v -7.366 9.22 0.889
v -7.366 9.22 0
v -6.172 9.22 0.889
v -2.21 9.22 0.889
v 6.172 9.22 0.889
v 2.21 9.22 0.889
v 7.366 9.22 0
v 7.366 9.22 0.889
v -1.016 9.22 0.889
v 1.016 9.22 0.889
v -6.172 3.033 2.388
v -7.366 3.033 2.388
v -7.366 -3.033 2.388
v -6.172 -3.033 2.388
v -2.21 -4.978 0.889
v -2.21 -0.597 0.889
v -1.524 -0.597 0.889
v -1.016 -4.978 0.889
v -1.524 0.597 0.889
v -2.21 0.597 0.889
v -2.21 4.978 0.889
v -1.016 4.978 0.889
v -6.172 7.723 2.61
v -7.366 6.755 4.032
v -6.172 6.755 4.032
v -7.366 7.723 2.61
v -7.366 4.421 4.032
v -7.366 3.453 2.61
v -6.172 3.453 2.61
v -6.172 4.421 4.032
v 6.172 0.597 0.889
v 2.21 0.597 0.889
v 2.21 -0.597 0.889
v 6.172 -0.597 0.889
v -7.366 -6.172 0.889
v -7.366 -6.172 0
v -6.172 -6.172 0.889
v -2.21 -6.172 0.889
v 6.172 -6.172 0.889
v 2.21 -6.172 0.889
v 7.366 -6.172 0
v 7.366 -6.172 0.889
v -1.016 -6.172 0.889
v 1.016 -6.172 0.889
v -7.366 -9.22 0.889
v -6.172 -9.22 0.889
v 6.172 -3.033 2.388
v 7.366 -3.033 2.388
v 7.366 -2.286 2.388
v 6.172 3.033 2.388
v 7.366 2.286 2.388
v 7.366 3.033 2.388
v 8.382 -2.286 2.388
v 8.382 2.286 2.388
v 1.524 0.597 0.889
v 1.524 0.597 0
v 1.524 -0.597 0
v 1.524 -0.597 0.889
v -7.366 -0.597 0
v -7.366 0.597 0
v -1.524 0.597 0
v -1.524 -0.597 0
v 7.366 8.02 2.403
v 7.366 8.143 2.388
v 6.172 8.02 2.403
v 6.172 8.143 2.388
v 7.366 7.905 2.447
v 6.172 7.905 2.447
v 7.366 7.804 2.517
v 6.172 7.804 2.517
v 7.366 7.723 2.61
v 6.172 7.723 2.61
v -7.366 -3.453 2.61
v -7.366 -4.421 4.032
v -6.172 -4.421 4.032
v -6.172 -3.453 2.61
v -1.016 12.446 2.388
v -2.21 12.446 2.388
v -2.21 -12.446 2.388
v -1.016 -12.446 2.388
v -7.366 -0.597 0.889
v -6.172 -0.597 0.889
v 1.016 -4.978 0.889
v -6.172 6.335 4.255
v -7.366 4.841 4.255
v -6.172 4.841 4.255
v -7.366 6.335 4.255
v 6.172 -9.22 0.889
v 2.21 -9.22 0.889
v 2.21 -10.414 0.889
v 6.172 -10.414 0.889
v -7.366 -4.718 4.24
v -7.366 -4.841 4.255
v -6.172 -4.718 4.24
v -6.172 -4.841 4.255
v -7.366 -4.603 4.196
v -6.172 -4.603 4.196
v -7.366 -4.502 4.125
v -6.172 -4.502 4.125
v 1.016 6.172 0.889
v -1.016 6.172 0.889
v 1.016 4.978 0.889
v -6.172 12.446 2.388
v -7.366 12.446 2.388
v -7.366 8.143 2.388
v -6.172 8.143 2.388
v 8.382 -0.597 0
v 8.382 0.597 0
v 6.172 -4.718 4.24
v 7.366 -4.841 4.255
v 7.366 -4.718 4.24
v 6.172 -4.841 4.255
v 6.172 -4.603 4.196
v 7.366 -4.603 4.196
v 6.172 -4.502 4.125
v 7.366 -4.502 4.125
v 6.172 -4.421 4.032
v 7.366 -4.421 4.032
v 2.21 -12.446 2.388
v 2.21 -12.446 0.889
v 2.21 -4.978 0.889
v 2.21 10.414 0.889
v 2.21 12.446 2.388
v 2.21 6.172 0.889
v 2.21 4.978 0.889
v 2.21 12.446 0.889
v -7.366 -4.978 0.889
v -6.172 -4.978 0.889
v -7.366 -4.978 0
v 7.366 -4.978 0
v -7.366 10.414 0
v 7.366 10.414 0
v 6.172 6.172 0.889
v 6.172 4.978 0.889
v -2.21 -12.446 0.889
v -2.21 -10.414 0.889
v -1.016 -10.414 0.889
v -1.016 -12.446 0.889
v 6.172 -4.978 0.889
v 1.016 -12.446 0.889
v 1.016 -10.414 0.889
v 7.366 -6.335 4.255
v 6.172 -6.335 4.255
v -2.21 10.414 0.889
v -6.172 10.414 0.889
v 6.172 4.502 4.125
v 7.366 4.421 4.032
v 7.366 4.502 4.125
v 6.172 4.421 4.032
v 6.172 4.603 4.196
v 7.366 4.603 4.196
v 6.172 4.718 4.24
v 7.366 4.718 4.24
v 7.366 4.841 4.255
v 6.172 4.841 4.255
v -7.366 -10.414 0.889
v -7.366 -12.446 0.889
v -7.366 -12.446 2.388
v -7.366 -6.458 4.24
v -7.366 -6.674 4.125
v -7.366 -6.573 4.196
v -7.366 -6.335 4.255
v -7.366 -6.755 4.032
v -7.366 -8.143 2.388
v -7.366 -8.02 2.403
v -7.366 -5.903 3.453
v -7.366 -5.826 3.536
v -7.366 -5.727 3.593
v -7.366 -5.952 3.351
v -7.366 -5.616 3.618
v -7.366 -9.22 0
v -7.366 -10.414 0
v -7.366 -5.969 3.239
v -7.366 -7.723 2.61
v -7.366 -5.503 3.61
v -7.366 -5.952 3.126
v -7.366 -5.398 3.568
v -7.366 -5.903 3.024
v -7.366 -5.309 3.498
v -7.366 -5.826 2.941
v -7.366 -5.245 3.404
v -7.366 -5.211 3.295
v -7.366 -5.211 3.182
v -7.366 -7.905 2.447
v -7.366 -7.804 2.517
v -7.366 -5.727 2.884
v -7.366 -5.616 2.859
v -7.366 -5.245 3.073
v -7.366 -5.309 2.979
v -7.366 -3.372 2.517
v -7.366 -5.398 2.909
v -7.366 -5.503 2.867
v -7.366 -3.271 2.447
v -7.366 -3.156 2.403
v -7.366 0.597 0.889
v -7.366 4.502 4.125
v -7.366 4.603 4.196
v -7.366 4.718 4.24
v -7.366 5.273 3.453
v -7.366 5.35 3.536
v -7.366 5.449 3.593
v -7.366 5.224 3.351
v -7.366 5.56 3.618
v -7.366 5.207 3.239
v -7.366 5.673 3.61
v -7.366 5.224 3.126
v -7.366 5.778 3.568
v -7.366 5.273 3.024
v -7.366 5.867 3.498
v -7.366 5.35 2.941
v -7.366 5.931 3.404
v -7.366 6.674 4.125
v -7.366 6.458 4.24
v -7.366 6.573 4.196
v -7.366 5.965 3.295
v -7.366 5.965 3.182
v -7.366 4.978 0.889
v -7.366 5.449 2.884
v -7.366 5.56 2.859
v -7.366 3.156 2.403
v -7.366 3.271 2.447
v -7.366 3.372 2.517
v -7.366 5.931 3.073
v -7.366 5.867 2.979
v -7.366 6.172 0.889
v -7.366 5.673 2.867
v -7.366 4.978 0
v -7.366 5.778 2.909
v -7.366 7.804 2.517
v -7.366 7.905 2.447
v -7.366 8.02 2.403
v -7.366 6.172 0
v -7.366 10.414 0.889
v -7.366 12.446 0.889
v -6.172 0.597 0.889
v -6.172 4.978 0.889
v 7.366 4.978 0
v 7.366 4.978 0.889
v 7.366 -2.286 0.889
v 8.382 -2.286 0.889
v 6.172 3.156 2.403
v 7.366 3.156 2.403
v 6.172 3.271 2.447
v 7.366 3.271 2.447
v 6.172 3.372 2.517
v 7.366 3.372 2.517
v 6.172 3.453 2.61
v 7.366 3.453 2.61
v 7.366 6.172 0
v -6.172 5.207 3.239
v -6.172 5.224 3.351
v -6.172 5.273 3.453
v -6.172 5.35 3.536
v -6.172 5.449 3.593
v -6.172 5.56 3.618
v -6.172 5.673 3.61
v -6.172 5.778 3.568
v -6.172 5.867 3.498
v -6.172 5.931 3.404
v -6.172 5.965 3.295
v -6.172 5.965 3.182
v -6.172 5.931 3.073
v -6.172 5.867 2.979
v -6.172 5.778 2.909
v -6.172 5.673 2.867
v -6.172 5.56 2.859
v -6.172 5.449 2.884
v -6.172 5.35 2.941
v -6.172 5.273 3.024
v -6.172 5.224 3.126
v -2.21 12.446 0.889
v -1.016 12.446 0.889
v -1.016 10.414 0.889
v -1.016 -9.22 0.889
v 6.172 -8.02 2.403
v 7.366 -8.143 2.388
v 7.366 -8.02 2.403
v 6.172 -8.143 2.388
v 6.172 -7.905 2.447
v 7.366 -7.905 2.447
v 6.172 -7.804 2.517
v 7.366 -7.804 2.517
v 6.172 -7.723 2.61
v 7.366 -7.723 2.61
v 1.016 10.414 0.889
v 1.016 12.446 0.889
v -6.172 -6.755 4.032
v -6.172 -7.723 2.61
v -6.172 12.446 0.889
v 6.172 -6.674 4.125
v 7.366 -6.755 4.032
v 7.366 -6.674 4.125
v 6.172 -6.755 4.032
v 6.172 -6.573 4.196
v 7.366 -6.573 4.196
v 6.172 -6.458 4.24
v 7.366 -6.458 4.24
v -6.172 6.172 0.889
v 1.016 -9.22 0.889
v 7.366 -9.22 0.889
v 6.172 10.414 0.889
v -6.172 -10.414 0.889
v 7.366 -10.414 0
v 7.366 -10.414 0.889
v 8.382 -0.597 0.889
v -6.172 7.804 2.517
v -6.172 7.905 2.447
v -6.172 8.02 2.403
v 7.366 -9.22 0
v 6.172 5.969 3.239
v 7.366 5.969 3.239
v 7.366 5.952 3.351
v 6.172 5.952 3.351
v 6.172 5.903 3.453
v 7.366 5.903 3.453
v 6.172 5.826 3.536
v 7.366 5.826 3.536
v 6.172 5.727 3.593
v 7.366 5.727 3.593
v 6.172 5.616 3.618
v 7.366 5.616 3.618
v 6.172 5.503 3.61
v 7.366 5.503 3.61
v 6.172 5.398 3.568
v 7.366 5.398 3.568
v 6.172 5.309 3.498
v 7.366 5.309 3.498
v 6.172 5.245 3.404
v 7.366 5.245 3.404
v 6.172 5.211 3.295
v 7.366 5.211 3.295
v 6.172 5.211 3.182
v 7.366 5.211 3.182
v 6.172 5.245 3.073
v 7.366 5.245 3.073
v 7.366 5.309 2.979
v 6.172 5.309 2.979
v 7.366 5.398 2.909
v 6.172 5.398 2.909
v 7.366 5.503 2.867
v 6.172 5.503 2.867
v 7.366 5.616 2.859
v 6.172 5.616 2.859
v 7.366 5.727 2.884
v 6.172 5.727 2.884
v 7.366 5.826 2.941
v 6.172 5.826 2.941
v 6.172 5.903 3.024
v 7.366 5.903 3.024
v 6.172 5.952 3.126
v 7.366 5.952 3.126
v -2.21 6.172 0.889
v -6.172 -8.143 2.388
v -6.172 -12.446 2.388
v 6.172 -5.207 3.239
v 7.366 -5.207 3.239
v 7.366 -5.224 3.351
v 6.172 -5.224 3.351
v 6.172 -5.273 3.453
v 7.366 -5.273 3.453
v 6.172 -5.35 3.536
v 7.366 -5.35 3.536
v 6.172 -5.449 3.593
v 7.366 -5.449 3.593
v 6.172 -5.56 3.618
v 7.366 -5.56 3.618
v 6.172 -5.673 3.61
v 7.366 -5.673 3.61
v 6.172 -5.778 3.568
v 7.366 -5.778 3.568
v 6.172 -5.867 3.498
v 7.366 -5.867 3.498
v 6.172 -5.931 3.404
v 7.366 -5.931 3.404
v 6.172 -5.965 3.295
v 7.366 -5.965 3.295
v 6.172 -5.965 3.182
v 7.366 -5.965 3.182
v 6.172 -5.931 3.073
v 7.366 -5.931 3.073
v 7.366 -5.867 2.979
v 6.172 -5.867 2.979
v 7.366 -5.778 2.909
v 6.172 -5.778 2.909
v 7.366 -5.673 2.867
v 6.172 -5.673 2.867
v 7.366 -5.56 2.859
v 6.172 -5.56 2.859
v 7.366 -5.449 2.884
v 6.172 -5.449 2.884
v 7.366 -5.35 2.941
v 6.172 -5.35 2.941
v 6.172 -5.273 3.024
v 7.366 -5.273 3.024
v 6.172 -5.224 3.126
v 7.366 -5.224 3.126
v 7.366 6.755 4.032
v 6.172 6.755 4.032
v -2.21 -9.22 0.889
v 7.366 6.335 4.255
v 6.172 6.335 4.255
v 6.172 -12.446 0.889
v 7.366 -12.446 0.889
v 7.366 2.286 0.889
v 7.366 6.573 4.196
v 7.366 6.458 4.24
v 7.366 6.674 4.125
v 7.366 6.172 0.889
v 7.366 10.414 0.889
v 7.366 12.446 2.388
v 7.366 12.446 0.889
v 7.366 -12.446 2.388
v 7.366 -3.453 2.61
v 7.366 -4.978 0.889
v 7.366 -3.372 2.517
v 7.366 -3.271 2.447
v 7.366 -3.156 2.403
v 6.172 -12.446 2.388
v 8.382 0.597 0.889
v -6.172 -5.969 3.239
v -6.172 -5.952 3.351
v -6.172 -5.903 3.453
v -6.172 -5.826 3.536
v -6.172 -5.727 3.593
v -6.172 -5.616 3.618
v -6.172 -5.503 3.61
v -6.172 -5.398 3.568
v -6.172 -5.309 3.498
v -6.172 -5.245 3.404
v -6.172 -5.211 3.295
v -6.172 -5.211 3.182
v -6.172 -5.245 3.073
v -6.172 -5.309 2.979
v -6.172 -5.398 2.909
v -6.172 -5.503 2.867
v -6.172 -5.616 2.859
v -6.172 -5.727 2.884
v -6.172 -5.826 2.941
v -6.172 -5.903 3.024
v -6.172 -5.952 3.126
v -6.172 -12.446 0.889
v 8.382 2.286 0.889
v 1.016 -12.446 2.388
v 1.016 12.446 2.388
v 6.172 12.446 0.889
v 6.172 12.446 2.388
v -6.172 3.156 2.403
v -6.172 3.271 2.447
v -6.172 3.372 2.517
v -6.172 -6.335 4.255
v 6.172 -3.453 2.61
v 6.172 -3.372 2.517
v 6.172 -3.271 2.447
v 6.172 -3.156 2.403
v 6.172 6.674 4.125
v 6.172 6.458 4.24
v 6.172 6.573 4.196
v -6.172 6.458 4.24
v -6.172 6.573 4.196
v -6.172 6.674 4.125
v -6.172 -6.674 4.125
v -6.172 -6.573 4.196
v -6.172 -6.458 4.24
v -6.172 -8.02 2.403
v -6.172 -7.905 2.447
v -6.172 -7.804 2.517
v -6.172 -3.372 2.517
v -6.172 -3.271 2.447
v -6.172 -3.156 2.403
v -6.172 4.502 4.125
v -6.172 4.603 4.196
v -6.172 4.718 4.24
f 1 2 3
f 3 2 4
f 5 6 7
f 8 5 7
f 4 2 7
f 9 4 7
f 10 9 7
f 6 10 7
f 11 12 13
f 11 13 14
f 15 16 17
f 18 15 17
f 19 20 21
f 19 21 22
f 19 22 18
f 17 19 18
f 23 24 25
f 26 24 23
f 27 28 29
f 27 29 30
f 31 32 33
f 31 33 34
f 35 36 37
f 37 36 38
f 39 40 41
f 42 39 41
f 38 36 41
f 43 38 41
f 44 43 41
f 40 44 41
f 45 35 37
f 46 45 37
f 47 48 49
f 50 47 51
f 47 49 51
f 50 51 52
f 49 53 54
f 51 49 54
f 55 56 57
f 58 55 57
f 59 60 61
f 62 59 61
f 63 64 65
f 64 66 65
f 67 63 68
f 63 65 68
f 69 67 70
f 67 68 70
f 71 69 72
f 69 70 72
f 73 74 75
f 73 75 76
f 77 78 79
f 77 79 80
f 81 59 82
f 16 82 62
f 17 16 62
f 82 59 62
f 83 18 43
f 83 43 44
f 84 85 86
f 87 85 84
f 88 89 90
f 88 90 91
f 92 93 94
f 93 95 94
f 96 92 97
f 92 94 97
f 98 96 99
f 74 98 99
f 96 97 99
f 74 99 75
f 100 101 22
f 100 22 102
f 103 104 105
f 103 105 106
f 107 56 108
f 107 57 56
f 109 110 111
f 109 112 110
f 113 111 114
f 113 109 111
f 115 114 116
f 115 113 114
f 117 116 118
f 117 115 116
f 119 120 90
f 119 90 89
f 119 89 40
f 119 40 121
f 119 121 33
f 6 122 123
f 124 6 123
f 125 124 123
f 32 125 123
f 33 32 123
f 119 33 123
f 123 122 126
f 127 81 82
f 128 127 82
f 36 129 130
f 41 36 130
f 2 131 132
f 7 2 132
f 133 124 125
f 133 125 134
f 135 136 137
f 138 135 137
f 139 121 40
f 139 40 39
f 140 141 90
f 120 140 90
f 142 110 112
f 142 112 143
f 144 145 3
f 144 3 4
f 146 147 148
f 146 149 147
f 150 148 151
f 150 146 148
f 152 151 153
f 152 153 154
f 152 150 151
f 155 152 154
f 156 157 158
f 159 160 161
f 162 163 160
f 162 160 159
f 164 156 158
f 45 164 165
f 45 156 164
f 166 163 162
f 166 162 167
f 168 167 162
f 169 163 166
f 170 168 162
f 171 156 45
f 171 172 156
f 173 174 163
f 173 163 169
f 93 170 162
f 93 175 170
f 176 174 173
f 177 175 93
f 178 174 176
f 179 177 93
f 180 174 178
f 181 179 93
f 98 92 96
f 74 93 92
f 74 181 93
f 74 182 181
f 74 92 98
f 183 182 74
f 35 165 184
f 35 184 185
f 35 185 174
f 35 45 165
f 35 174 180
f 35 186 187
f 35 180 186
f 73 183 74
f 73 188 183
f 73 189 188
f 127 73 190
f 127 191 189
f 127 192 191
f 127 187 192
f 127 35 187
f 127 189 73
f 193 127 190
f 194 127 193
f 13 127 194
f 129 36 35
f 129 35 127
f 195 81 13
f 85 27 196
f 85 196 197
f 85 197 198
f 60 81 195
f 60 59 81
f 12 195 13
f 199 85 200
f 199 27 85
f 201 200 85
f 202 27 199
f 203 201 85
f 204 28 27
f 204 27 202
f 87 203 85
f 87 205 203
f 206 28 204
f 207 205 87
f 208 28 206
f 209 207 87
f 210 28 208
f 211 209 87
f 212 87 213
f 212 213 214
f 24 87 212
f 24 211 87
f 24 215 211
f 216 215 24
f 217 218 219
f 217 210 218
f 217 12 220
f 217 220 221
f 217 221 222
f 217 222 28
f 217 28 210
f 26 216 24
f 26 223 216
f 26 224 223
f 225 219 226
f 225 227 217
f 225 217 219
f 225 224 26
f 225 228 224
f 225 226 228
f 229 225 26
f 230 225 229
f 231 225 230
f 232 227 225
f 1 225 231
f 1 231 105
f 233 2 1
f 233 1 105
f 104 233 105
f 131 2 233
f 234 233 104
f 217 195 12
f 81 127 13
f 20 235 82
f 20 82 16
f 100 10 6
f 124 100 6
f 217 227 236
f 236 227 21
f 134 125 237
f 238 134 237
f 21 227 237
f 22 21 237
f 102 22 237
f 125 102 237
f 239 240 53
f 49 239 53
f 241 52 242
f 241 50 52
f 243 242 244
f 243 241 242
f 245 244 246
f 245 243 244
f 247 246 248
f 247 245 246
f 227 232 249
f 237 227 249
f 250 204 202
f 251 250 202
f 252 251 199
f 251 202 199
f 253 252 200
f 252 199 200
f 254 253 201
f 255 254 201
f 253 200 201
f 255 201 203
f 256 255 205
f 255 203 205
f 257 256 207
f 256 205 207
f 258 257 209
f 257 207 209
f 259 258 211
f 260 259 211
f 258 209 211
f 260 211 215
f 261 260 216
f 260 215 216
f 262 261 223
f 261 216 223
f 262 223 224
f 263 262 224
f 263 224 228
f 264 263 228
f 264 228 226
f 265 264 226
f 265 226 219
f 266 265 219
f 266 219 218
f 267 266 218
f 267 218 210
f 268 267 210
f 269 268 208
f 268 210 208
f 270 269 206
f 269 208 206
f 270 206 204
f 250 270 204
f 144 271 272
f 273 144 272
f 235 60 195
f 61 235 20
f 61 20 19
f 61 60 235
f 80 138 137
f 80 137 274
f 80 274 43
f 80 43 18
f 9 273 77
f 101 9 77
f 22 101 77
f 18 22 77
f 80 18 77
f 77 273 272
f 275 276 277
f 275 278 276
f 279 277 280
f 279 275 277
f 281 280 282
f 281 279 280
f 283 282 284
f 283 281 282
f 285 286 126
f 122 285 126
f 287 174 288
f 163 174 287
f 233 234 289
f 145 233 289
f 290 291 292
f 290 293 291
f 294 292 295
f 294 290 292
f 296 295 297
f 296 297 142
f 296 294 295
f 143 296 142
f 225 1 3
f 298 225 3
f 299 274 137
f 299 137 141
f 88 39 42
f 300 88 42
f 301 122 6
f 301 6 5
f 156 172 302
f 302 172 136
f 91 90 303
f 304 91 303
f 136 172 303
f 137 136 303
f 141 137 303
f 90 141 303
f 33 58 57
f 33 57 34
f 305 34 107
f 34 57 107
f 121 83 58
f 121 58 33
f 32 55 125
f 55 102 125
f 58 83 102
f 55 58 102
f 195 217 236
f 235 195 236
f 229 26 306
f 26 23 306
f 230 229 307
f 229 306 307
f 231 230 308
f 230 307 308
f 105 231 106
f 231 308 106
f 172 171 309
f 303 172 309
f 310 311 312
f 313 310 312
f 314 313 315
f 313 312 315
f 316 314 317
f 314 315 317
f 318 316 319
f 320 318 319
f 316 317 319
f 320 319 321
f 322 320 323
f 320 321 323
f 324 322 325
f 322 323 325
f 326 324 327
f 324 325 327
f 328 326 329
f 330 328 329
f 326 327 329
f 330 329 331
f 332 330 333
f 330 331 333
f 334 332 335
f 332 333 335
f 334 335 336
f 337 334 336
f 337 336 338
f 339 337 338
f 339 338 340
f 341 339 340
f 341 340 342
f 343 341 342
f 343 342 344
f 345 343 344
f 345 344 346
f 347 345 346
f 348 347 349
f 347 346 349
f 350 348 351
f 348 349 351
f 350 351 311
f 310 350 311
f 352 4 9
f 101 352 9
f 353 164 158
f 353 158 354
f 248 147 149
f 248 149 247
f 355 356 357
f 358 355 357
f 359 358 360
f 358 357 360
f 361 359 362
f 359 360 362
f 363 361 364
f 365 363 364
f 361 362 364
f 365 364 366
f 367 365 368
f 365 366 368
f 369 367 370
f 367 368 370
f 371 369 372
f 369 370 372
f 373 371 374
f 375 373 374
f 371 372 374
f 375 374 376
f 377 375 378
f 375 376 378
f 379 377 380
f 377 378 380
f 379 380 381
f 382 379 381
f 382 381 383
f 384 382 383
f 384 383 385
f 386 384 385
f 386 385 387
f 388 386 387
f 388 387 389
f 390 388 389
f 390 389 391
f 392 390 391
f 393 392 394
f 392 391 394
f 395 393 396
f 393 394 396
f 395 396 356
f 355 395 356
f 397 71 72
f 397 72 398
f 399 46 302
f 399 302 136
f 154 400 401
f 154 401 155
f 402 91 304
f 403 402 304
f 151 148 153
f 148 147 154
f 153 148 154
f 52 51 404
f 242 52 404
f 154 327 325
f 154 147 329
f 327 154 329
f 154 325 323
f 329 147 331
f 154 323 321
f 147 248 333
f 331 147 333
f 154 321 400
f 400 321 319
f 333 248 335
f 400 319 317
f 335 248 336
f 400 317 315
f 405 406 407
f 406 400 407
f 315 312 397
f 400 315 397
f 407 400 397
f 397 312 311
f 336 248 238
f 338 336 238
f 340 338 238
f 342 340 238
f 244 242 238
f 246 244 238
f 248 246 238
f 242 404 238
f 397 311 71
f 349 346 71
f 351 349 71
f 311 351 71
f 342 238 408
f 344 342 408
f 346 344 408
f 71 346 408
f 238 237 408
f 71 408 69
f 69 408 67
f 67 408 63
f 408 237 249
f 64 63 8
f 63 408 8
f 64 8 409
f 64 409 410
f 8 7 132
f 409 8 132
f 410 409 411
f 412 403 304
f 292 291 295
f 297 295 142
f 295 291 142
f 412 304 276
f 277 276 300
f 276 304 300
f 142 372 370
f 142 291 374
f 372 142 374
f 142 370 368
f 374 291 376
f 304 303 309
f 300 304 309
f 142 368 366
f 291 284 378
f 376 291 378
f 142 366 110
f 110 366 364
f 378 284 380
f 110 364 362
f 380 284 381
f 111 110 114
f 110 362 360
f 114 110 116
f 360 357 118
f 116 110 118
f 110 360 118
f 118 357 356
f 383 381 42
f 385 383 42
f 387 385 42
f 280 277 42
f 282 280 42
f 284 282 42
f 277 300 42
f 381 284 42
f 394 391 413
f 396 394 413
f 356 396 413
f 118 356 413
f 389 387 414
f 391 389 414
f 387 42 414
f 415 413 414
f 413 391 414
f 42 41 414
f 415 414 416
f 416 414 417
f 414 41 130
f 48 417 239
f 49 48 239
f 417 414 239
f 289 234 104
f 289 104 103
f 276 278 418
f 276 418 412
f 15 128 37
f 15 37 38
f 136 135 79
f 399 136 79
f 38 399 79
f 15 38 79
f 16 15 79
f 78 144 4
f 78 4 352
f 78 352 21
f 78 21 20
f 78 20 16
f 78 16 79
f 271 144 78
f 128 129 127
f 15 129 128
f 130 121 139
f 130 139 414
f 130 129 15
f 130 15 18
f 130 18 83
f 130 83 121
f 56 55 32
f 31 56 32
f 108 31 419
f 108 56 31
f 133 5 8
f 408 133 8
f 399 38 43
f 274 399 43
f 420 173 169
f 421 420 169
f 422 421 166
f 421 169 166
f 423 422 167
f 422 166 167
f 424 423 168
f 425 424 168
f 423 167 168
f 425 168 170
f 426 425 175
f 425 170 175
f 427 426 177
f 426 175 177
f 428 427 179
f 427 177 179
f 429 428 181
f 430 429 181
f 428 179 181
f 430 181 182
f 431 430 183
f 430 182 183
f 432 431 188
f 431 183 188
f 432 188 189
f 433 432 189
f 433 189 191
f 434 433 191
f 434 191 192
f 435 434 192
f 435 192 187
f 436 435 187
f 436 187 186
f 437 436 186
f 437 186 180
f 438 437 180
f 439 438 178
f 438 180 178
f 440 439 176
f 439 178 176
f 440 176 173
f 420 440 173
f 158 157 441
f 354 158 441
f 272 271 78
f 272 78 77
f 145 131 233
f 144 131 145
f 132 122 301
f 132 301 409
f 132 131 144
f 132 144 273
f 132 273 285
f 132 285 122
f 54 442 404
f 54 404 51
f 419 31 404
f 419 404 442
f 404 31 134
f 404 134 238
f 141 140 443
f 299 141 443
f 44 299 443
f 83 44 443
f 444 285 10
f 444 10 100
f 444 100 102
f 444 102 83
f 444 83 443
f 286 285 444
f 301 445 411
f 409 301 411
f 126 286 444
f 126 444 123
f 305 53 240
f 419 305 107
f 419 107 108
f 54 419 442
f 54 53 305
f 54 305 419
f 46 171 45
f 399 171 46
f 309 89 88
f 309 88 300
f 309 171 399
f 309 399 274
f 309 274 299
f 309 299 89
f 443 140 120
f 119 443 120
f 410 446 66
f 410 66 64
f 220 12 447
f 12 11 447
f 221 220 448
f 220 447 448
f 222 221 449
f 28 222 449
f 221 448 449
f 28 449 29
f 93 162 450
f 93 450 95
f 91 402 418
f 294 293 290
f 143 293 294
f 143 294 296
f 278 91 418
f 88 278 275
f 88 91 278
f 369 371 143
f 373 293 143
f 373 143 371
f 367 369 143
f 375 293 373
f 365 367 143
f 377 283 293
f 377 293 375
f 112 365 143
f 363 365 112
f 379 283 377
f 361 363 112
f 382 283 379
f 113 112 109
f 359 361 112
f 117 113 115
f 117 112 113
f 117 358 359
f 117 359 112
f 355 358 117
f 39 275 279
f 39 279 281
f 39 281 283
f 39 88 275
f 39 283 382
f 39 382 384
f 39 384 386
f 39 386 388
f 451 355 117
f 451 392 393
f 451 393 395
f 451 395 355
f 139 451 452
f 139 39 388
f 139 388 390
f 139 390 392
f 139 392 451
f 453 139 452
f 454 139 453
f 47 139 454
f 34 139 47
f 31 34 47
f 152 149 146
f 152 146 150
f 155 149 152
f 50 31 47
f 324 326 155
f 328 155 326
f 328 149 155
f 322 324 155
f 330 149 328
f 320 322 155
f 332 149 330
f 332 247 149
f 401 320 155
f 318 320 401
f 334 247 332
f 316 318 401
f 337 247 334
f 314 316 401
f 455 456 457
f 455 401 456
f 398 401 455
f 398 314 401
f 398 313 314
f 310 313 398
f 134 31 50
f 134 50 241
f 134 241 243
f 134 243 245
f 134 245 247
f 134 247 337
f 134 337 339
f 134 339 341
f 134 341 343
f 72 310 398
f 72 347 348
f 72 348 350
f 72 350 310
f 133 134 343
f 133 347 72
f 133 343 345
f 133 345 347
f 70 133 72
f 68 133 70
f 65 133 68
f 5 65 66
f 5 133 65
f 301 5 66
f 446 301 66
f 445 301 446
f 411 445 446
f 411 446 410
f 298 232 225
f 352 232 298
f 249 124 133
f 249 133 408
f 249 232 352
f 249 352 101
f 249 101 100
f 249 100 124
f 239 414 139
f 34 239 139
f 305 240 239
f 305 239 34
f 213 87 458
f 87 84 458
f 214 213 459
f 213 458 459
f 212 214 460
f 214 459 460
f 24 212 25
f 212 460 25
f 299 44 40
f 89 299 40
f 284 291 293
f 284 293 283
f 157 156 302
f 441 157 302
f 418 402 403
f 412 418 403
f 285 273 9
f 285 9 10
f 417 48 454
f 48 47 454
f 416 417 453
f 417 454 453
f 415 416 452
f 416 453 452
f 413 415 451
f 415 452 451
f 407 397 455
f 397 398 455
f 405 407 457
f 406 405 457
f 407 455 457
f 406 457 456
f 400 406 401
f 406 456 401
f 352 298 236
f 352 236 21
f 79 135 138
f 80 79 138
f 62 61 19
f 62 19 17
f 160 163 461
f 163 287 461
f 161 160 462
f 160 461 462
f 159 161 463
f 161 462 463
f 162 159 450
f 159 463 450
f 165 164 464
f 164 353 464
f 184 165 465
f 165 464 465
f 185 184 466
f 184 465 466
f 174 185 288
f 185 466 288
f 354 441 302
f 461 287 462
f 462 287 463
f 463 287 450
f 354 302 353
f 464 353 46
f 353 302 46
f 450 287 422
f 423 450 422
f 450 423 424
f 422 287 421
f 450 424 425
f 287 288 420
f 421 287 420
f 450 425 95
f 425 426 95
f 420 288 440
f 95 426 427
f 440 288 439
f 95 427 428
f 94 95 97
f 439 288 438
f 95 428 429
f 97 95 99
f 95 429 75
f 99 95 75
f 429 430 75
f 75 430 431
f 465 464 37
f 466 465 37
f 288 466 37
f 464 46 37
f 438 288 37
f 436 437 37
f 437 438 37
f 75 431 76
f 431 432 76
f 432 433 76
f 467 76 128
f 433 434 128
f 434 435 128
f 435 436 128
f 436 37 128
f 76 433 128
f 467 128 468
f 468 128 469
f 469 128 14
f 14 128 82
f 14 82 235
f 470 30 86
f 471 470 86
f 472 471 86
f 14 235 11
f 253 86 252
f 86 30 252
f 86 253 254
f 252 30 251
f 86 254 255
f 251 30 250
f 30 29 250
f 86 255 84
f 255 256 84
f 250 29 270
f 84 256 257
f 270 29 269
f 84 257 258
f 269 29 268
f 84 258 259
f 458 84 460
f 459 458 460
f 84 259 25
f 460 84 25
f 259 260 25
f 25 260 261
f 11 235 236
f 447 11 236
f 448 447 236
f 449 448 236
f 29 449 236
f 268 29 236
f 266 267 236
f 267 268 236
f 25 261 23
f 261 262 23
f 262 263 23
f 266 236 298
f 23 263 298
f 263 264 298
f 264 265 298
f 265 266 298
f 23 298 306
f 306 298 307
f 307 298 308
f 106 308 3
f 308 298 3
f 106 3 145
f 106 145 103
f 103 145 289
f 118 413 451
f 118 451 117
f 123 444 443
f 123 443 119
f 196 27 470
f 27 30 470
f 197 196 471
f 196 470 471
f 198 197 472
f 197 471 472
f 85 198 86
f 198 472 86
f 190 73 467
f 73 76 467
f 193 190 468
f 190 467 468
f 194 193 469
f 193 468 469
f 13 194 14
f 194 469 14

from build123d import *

# Parameters (mm, degrees)
F0_W      = 14.732
F0_H      = 1.1938
F1_DEPTH  = 0.889
F2_W      = 1.1938
F2_H      = 24.892
F3_DEPTH  = 1.4986
F4_R      = 0.381
F5_DEPTH  = 1.1938
F6_R      = 0.381
F7_DEPTH  = 1.1938
F8_R      = 0.508
F9_W      = 3.048
F9_H      = 1.1938
F10_DEPTH = 0.889
F11_W     = 1.016
F11_H     = 1.1938
F12_DEPTH = 2.3876
F13_W     = 4.572
F13_H     = 1.4986
F14_DEPTH = 1.016


with BuildPart() as f1:
    # F0 (on Top) → F1 (new body)
    with BuildSketch(Plane.XY):
        with Locations((0, 9.8171)):
            Rectangle(F0_W, F0_H)
    extrude(amount=F1_DEPTH)



with BuildPart() as f1b:
    # F0 (on Top) → F1, piece 2 (new body)
    with BuildSketch(Plane.XY):
        with Locations((0, -9.8171)):
            Rectangle(F0_W, F0_H)
    extrude(amount=F1_DEPTH)


with BuildPart() as f1c:
    # F0 (on Top) → F1, piece 3 (new body)
    with BuildSketch(Plane.XY):
        with Locations((0, -5.5753)):
            Rectangle(F0_W, F0_H)
    extrude(amount=F1_DEPTH)


with BuildPart() as f1d:
    # F0 (on Top) → F1, piece 4 (new body)
    with BuildSketch(Plane.XY):
        Rectangle(F0_W, F0_H)
    extrude(amount=F1_DEPTH)


with BuildPart() as f1e:
    # F0 (on Top) → F1, piece 5 (new body)
    with BuildSketch(Plane.XY):
        with Locations((0, 5.5753)):
            Rectangle(F0_W, F0_H)
    extrude(amount=F1_DEPTH)


with BuildPart() as f1_1:
    add(f1.part)

    add(f1b.part)  # F3 merges F1b

    add(f1c.part)  # F3 merges F1c

    add(f1d.part)  # F3 merges F1d

    add(f1e.part)  # F3 merges F1e
    # F2 (on face) → F3 (join)
    with BuildSketch(Plane.XY.offset(0.889)):
        with Locations((-6.7691, 0)):
            Rectangle(F2_W, F2_H)
        with Locations((6.7691, 0)):
            Rectangle(F2_W, F2_H)
        with Locations((-1.6129, 0)):
            Rectangle(F2_W, F2_H)
        with Locations((1.6129, 0)):
            Rectangle(F2_W, F2_H)
    extrude(amount=F3_DEPTH)

    # F4 (on face) → F5 (join)
    with BuildSketch(Plane(origin=(-7.366, 0, 0), x_dir=(0, -1, 0), z_dir=(-1, 0, 0))):
        Polygon((-6.604, 4.2545157337), (-7.874, 2.3876), (-3.302, 2.3876), (-4.572, 4.2545157337), align=None)
        with Locations((-5.588, 3.2385157337)):
            Circle(F4_R, mode=Mode.SUBTRACT)
        Polygon((4.572, 4.2545157337), (3.302, 2.3876), (7.874, 2.3876), (6.604, 4.2545157337), align=None)
        with Locations((5.588, 3.2385157337)):
            Circle(F4_R, mode=Mode.SUBTRACT)
    extrude(amount=-F5_DEPTH)

    # F6 (on face) → F7 (join)
    with BuildSketch(Plane.YZ.offset(7.366)):
        Polygon((-6.604, 4.2545157337), (-7.874, 2.3876), (-3.302, 2.3876), (-4.572, 4.2545157337), align=None)
        with Locations((-5.588, 3.2385157337)):
            Circle(F6_R, mode=Mode.SUBTRACT)
        Polygon((3.302, 2.3876), (7.874, 2.3876), (6.604, 4.2545157337), (4.572, 4.2545157337), align=None)
        with Locations((5.588, 3.2385157337)):
            Circle(F6_R, mode=Mode.SUBTRACT)
    extrude(amount=-F7_DEPTH)

    # F8
    f8_edges = [f1_1.edges().sort_by_distance(p)[0] for p in [
        (6.7691, -4.572, 4.254516),
        (6.7691, -6.604, 4.254516),
        (6.7691, -3.302, 2.3876),
        (6.7691, -7.874, 2.3876),
        (6.7691, 4.572, 4.254516),
        (6.7691, 3.302, 2.3876),
        (6.7691, 6.604, 4.254516),
        (6.7691, 7.874, 2.3876),
        (-6.7691, 7.874, 2.3876),
        (-6.7691, 6.604, 4.254516),
        (-6.7691, 4.572, 4.254516),
        (-6.7691, 3.302, 2.3876),
        (-6.7691, -7.874, 2.3876),
        (-6.7691, -6.604, 4.254516),
        (-6.7691, -4.572, 4.254516),
        (-6.7691, -3.302, 2.3876),
    ]]
    fillet(f8_edges, radius=F8_R)

    # F9 (on face) → F10 (cut, through all)
    with BuildSketch(Plane(origin=(0, 0, 0), x_dir=(1, 0, 0), z_dir=(0, 0, -1))):
        Rectangle(F9_W, F9_H)
    extrude(amount=-F10_DEPTH, mode=Mode.SUBTRACT)

    # F11 (on face) → F12 (join, through all)
    with BuildSketch(Plane(origin=(0, 0, 0), x_dir=(1, 0, 0), z_dir=(0, 0, -1))):
        with Locations((7.874, 0)):
            Rectangle(F11_W, F11_H)
    extrude(amount=-F12_DEPTH)

    # F13 (on face) → F14 (join, through all)
    with BuildSketch(Plane.YZ.offset(8.382)):
        with Locations((0, 1.6383)):
            Rectangle(F13_W, F13_H)
    extrude(amount=-F14_DEPTH)


solid = f1_1.part
